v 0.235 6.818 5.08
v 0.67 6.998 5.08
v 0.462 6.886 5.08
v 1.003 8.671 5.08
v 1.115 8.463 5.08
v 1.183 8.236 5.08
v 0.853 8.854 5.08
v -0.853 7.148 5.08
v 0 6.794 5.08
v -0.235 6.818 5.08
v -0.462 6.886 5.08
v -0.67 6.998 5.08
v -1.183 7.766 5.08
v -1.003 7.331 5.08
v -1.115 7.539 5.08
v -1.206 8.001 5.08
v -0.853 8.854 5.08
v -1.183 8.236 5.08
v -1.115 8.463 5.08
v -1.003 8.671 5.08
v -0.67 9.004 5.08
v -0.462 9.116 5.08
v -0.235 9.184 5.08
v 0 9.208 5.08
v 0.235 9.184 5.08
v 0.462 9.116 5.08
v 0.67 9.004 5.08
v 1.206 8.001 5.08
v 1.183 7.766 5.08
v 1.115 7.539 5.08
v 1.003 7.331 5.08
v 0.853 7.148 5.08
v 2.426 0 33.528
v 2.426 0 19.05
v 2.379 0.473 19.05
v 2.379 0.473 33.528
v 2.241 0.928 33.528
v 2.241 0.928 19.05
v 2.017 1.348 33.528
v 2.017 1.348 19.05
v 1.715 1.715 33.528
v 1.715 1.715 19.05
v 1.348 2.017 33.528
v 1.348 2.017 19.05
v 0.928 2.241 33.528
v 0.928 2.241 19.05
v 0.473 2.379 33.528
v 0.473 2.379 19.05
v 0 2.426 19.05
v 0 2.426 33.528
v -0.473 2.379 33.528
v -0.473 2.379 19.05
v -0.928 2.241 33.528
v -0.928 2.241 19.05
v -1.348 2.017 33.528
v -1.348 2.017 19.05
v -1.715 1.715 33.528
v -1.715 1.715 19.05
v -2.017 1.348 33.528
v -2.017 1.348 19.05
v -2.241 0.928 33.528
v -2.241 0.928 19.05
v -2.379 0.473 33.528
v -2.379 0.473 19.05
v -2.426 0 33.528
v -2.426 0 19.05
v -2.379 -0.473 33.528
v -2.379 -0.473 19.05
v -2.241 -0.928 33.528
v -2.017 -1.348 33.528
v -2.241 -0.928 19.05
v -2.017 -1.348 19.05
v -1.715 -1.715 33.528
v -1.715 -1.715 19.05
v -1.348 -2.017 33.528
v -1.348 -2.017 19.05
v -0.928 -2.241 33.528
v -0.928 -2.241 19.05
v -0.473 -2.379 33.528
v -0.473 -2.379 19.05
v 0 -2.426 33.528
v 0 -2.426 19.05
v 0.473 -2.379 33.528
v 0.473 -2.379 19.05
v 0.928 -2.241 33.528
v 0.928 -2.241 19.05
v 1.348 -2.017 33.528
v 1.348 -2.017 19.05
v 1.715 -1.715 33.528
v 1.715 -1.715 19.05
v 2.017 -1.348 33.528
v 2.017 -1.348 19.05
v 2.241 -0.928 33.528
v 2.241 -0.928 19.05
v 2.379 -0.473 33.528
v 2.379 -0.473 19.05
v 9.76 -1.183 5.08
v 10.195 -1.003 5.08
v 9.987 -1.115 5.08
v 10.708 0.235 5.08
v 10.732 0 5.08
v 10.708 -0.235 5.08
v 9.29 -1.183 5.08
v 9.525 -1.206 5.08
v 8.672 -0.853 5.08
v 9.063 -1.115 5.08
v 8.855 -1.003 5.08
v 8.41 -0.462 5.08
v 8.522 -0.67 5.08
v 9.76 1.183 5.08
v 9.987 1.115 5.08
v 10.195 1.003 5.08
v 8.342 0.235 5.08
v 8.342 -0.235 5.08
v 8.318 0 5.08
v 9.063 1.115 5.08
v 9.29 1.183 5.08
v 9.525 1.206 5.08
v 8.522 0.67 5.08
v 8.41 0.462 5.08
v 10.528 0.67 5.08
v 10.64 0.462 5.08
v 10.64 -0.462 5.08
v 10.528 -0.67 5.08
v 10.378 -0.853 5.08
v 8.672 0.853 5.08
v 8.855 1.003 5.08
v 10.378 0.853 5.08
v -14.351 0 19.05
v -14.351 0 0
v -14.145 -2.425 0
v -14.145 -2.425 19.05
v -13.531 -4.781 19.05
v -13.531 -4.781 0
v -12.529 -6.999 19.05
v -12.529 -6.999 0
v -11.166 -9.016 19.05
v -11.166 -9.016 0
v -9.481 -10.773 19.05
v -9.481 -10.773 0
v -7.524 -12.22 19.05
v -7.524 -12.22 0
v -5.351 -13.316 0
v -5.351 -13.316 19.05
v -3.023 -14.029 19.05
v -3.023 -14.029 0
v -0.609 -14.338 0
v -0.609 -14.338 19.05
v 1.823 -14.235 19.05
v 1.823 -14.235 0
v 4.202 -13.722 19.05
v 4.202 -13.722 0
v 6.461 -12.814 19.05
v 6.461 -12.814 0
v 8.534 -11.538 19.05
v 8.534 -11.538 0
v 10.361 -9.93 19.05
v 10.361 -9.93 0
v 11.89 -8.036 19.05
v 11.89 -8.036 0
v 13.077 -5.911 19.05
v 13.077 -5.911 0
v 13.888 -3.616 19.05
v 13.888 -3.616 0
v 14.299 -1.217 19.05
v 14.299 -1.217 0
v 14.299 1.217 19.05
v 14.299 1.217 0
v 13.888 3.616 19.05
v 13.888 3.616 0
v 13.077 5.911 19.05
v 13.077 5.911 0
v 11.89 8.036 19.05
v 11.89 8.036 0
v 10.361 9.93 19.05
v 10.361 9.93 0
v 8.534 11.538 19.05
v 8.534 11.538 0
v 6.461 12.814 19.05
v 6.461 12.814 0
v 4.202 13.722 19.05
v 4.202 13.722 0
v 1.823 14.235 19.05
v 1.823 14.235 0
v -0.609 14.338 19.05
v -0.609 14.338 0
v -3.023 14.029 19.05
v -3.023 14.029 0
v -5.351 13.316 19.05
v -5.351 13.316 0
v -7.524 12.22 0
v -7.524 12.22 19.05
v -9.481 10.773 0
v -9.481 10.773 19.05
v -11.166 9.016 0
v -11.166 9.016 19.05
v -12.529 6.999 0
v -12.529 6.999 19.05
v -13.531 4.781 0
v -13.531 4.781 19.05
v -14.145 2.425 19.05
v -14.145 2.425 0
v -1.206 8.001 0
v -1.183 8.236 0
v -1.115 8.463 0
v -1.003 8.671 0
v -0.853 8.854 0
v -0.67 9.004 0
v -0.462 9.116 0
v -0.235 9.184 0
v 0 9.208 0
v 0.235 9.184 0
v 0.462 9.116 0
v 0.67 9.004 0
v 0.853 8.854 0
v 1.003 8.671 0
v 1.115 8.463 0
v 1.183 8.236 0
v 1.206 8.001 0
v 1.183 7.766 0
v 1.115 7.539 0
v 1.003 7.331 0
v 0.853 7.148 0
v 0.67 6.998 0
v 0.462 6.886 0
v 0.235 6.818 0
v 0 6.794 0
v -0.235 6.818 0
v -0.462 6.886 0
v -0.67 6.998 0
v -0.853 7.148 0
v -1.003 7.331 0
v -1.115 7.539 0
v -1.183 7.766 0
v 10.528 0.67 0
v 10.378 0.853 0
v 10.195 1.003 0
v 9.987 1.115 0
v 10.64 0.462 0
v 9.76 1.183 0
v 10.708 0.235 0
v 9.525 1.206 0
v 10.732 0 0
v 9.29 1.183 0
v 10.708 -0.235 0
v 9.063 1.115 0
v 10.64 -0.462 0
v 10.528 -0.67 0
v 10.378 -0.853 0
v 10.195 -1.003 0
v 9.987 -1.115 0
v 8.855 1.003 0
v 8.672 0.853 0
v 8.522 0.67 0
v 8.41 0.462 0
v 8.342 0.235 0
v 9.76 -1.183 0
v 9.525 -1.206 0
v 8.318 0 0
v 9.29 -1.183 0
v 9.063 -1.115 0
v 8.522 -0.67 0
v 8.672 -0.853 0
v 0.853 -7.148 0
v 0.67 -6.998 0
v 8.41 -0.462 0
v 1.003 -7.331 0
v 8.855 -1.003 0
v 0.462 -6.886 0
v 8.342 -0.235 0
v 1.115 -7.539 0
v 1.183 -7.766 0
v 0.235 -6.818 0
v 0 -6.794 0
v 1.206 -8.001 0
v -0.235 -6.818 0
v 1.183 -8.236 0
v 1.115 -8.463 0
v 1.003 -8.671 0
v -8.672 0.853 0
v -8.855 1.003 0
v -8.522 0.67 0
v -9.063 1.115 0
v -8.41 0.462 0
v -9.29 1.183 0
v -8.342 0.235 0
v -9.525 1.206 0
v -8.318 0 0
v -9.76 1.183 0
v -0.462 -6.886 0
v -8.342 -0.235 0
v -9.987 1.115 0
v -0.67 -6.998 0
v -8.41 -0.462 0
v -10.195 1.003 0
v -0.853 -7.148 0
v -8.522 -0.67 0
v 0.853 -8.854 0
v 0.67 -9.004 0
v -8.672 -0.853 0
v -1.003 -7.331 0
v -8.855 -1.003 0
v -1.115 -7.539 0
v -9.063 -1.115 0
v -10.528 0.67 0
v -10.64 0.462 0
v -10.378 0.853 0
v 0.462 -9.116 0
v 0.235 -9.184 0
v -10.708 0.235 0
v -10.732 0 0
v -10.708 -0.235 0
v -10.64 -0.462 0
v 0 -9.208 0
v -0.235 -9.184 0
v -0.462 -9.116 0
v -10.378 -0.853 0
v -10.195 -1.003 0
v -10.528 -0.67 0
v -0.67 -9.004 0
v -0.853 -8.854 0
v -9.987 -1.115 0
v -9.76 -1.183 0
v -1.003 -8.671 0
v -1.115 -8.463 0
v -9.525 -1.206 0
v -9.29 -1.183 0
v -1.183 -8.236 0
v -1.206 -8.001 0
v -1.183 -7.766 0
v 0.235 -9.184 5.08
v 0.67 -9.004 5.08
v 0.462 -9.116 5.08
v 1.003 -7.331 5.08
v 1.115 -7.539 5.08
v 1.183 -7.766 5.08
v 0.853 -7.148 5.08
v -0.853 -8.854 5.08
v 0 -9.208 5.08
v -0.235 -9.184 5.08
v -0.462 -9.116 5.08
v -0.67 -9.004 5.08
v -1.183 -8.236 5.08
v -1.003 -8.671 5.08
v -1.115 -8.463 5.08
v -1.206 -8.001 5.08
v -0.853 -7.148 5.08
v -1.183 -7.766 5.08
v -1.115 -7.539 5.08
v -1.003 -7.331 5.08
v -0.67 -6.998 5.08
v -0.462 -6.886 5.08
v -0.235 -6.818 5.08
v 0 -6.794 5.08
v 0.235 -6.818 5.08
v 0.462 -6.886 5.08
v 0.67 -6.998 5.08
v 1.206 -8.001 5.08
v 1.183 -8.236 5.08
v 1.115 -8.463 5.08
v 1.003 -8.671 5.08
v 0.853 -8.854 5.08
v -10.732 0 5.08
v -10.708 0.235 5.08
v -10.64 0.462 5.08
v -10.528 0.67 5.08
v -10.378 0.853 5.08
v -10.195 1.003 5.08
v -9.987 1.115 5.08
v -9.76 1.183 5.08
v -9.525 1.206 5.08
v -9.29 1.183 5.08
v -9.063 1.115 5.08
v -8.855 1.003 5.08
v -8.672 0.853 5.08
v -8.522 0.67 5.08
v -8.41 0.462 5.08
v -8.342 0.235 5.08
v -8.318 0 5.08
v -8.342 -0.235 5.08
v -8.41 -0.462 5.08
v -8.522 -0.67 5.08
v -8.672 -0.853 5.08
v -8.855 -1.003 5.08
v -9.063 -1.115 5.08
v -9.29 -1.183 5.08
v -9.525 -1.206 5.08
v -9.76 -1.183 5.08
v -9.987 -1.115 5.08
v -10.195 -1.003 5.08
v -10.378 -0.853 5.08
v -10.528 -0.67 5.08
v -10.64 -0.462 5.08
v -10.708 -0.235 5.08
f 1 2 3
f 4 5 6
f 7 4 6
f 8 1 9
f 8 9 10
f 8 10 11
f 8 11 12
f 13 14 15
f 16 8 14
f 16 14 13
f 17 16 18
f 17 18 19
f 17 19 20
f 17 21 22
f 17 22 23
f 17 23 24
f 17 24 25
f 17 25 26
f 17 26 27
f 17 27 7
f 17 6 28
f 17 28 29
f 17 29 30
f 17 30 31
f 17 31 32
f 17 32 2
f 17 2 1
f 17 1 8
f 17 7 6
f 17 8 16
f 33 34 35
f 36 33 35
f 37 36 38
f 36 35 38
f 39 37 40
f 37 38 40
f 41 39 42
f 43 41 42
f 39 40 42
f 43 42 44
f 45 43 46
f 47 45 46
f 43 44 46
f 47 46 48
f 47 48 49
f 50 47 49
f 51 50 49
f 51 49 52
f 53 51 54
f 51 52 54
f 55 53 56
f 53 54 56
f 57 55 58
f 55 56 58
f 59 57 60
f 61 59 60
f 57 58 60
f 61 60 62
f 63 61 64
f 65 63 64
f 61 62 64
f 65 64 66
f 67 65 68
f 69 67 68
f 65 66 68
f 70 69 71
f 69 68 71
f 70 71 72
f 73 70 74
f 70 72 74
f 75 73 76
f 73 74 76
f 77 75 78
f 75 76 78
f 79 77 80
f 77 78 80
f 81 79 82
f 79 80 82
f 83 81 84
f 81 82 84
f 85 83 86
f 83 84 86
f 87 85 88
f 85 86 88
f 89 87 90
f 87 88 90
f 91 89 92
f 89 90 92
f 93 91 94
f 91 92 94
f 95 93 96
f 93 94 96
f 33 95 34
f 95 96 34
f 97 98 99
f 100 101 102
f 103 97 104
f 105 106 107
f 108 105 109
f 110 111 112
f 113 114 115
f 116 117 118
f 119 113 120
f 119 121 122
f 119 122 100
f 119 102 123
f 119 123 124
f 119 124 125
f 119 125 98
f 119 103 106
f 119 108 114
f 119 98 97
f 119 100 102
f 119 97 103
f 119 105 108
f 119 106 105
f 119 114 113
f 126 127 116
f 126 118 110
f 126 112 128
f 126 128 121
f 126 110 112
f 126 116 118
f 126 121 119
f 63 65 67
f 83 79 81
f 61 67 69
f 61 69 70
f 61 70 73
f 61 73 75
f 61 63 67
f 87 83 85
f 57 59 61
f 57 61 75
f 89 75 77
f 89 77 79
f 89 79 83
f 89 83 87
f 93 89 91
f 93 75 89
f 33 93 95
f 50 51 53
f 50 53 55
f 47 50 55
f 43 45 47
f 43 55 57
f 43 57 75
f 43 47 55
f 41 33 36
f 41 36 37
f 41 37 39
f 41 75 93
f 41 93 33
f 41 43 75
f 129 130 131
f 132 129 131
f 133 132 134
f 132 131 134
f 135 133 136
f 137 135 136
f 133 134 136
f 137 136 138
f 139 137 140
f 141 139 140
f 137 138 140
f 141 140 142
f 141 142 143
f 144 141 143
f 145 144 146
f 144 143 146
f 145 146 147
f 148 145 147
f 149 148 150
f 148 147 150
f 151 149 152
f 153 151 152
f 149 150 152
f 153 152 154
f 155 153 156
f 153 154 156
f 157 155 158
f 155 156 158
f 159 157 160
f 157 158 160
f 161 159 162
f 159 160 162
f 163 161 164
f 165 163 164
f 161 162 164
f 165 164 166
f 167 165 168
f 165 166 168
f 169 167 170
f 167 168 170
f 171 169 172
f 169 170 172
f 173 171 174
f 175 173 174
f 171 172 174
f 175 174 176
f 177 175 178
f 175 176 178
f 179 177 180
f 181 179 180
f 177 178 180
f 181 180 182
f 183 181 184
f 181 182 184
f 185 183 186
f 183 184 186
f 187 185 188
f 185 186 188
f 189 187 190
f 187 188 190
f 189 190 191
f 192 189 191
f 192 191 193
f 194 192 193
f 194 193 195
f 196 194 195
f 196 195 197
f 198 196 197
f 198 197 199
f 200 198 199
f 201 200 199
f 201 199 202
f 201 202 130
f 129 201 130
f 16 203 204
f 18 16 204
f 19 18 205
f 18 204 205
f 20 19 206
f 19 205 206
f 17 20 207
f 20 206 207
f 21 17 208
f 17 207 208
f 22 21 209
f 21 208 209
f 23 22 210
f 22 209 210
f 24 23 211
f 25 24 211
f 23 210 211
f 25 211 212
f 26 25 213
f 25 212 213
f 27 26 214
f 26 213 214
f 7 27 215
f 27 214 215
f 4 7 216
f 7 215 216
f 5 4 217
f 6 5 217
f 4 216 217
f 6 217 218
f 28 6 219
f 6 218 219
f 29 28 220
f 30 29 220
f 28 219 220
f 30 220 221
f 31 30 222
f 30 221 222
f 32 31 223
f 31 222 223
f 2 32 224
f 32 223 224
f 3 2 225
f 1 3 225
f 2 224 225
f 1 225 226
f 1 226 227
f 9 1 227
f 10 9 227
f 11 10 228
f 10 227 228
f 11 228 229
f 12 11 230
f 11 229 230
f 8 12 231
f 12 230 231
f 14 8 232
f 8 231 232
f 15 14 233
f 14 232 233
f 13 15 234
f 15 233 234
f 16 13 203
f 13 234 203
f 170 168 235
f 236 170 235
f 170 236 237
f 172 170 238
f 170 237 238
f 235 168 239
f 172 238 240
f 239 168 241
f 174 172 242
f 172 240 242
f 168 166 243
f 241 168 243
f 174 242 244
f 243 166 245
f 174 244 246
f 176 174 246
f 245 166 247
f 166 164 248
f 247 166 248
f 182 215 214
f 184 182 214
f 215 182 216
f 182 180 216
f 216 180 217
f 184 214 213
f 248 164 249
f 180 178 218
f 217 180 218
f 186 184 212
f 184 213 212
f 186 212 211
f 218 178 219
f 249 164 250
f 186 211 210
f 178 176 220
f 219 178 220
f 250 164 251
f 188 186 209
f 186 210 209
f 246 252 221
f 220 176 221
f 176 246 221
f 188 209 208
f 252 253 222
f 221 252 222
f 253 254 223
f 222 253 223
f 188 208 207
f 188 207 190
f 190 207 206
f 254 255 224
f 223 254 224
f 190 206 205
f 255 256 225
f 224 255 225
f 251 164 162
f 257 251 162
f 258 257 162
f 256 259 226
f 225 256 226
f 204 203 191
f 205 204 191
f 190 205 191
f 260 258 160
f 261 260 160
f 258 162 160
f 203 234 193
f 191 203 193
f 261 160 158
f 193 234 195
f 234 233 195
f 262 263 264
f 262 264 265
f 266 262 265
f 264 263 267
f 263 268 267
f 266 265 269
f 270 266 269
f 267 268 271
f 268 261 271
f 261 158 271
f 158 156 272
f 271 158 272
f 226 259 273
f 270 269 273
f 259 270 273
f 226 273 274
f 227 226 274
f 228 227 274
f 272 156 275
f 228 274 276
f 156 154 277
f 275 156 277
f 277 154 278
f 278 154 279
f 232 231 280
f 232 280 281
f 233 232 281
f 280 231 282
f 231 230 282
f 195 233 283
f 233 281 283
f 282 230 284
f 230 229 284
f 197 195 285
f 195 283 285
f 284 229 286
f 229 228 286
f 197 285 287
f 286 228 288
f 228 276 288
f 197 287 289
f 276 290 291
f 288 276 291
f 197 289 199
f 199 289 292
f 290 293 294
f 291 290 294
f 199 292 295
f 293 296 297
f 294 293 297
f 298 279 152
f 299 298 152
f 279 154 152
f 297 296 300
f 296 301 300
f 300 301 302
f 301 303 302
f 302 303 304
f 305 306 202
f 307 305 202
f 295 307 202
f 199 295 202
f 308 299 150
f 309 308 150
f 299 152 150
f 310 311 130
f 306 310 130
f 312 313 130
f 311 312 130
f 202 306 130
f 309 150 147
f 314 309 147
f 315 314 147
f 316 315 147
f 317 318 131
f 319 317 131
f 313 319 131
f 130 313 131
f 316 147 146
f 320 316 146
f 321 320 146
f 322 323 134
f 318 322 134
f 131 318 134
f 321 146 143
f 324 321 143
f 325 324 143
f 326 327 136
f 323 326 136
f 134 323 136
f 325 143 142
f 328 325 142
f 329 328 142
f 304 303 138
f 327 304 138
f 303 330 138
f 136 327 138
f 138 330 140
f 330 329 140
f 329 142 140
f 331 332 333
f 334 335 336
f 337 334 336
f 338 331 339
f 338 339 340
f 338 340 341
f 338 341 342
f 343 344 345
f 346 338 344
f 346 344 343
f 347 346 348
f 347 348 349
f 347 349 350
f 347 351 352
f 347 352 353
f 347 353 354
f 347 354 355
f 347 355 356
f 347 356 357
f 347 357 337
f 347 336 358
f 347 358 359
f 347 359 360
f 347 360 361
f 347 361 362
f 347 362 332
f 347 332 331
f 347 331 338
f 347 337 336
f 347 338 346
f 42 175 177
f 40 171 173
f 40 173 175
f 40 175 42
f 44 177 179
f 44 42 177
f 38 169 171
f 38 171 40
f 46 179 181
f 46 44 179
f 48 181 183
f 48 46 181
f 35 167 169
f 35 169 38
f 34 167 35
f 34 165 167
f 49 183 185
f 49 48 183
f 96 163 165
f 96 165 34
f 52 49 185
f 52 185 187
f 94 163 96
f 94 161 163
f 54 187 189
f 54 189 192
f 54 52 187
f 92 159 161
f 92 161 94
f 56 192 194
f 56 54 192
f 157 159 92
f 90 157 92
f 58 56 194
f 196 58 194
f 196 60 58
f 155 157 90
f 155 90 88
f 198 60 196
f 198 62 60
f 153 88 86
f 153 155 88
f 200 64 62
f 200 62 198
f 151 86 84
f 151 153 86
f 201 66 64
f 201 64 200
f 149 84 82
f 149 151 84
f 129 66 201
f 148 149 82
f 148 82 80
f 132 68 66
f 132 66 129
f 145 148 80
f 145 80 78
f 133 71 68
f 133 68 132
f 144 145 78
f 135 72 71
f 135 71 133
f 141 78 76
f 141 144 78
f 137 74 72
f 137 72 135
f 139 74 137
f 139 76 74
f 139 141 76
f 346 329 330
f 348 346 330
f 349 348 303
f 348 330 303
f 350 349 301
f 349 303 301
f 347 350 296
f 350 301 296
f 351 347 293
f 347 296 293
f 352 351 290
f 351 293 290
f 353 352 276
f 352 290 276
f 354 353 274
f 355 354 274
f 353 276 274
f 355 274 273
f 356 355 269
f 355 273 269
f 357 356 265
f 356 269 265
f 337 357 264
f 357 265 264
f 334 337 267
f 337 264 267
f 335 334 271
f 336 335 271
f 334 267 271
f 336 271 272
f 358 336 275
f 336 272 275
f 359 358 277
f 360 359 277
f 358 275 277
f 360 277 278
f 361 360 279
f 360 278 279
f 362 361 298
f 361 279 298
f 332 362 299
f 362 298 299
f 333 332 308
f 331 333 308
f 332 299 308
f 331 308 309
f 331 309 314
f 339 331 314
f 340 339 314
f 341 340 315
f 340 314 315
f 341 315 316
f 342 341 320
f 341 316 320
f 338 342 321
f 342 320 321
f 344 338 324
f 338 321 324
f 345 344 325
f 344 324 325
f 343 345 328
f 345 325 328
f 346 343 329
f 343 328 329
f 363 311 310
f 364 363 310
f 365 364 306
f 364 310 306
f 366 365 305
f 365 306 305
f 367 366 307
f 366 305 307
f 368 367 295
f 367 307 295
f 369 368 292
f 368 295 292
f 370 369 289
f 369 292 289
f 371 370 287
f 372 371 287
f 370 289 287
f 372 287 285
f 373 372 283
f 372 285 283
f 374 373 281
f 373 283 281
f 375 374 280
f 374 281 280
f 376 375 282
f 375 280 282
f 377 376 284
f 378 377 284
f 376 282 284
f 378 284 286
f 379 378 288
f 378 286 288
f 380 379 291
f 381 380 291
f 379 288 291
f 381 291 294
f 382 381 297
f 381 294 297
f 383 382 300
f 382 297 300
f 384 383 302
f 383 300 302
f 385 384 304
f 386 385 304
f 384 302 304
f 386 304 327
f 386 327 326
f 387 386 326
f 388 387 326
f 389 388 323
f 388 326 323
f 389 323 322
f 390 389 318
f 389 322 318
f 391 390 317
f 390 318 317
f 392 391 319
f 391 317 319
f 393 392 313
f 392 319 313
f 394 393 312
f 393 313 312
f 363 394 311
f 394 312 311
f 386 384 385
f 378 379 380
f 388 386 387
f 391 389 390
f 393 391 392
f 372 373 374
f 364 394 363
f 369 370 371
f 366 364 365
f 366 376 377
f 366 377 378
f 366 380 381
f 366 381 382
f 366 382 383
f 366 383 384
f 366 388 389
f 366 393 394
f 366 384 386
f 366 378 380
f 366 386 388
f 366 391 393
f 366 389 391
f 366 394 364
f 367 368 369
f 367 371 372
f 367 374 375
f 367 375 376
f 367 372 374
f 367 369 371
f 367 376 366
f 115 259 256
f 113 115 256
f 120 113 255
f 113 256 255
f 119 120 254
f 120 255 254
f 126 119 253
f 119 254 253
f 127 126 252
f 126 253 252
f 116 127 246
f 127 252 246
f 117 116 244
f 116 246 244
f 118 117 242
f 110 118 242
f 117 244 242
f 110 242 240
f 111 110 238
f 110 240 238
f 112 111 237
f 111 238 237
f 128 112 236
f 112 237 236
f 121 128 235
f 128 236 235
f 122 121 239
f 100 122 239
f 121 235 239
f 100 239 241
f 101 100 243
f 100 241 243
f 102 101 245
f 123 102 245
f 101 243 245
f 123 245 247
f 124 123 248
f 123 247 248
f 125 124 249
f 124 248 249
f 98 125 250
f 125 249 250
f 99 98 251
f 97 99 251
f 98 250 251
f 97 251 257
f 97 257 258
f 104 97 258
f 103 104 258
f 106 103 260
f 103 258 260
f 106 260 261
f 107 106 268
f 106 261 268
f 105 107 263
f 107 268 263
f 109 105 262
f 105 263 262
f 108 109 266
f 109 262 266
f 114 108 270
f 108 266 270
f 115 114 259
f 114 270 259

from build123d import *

# Parameters (mm, degrees)
SKETCH1_R           = 14.351
BOSS_EXTRUDE1_DEPTH = 19.05
SKETCH2_R           = 2.4257
BOSS_EXTRUDE2_DEPTH = 14.478
SKETCH3_R           = 1.2065
CUT_EXTRUDE1_DEPTH  = 5.08


with BuildPart() as part:
    # Sketch1 → Boss-Extrude1 (new body)
    with BuildSketch(Plane.XY):
        with Locations(Location((0, 0, 0), (0, 0, 180))):
            Circle(SKETCH1_R)
    extrude(amount=BOSS_EXTRUDE1_DEPTH)

    # Sketch2 → Boss-Extrude2 (add)
    with BuildSketch(Plane.XY.offset(19.05)):
        Circle(SKETCH2_R)
    extrude(amount=BOSS_EXTRUDE2_DEPTH)

    # Sketch3 → Cut-Extrude1 (cut)
    with BuildSketch(Plane(origin=(0, 0, 0), x_dir=(-1, 0, 0), z_dir=(0, 0, -1))):
        with Locations((0, 8.001)):
            Circle(SKETCH3_R)
        with Locations((9.525, 0)):
            Circle(SKETCH3_R)
        with Locations((0, -8.001)):
            Circle(SKETCH3_R)
        with Locations((-9.525, 0)):
            Circle(SKETCH3_R)
    extrude(amount=-CUT_EXTRUDE1_DEPTH, mode=Mode.SUBTRACT)


solid = part.part
